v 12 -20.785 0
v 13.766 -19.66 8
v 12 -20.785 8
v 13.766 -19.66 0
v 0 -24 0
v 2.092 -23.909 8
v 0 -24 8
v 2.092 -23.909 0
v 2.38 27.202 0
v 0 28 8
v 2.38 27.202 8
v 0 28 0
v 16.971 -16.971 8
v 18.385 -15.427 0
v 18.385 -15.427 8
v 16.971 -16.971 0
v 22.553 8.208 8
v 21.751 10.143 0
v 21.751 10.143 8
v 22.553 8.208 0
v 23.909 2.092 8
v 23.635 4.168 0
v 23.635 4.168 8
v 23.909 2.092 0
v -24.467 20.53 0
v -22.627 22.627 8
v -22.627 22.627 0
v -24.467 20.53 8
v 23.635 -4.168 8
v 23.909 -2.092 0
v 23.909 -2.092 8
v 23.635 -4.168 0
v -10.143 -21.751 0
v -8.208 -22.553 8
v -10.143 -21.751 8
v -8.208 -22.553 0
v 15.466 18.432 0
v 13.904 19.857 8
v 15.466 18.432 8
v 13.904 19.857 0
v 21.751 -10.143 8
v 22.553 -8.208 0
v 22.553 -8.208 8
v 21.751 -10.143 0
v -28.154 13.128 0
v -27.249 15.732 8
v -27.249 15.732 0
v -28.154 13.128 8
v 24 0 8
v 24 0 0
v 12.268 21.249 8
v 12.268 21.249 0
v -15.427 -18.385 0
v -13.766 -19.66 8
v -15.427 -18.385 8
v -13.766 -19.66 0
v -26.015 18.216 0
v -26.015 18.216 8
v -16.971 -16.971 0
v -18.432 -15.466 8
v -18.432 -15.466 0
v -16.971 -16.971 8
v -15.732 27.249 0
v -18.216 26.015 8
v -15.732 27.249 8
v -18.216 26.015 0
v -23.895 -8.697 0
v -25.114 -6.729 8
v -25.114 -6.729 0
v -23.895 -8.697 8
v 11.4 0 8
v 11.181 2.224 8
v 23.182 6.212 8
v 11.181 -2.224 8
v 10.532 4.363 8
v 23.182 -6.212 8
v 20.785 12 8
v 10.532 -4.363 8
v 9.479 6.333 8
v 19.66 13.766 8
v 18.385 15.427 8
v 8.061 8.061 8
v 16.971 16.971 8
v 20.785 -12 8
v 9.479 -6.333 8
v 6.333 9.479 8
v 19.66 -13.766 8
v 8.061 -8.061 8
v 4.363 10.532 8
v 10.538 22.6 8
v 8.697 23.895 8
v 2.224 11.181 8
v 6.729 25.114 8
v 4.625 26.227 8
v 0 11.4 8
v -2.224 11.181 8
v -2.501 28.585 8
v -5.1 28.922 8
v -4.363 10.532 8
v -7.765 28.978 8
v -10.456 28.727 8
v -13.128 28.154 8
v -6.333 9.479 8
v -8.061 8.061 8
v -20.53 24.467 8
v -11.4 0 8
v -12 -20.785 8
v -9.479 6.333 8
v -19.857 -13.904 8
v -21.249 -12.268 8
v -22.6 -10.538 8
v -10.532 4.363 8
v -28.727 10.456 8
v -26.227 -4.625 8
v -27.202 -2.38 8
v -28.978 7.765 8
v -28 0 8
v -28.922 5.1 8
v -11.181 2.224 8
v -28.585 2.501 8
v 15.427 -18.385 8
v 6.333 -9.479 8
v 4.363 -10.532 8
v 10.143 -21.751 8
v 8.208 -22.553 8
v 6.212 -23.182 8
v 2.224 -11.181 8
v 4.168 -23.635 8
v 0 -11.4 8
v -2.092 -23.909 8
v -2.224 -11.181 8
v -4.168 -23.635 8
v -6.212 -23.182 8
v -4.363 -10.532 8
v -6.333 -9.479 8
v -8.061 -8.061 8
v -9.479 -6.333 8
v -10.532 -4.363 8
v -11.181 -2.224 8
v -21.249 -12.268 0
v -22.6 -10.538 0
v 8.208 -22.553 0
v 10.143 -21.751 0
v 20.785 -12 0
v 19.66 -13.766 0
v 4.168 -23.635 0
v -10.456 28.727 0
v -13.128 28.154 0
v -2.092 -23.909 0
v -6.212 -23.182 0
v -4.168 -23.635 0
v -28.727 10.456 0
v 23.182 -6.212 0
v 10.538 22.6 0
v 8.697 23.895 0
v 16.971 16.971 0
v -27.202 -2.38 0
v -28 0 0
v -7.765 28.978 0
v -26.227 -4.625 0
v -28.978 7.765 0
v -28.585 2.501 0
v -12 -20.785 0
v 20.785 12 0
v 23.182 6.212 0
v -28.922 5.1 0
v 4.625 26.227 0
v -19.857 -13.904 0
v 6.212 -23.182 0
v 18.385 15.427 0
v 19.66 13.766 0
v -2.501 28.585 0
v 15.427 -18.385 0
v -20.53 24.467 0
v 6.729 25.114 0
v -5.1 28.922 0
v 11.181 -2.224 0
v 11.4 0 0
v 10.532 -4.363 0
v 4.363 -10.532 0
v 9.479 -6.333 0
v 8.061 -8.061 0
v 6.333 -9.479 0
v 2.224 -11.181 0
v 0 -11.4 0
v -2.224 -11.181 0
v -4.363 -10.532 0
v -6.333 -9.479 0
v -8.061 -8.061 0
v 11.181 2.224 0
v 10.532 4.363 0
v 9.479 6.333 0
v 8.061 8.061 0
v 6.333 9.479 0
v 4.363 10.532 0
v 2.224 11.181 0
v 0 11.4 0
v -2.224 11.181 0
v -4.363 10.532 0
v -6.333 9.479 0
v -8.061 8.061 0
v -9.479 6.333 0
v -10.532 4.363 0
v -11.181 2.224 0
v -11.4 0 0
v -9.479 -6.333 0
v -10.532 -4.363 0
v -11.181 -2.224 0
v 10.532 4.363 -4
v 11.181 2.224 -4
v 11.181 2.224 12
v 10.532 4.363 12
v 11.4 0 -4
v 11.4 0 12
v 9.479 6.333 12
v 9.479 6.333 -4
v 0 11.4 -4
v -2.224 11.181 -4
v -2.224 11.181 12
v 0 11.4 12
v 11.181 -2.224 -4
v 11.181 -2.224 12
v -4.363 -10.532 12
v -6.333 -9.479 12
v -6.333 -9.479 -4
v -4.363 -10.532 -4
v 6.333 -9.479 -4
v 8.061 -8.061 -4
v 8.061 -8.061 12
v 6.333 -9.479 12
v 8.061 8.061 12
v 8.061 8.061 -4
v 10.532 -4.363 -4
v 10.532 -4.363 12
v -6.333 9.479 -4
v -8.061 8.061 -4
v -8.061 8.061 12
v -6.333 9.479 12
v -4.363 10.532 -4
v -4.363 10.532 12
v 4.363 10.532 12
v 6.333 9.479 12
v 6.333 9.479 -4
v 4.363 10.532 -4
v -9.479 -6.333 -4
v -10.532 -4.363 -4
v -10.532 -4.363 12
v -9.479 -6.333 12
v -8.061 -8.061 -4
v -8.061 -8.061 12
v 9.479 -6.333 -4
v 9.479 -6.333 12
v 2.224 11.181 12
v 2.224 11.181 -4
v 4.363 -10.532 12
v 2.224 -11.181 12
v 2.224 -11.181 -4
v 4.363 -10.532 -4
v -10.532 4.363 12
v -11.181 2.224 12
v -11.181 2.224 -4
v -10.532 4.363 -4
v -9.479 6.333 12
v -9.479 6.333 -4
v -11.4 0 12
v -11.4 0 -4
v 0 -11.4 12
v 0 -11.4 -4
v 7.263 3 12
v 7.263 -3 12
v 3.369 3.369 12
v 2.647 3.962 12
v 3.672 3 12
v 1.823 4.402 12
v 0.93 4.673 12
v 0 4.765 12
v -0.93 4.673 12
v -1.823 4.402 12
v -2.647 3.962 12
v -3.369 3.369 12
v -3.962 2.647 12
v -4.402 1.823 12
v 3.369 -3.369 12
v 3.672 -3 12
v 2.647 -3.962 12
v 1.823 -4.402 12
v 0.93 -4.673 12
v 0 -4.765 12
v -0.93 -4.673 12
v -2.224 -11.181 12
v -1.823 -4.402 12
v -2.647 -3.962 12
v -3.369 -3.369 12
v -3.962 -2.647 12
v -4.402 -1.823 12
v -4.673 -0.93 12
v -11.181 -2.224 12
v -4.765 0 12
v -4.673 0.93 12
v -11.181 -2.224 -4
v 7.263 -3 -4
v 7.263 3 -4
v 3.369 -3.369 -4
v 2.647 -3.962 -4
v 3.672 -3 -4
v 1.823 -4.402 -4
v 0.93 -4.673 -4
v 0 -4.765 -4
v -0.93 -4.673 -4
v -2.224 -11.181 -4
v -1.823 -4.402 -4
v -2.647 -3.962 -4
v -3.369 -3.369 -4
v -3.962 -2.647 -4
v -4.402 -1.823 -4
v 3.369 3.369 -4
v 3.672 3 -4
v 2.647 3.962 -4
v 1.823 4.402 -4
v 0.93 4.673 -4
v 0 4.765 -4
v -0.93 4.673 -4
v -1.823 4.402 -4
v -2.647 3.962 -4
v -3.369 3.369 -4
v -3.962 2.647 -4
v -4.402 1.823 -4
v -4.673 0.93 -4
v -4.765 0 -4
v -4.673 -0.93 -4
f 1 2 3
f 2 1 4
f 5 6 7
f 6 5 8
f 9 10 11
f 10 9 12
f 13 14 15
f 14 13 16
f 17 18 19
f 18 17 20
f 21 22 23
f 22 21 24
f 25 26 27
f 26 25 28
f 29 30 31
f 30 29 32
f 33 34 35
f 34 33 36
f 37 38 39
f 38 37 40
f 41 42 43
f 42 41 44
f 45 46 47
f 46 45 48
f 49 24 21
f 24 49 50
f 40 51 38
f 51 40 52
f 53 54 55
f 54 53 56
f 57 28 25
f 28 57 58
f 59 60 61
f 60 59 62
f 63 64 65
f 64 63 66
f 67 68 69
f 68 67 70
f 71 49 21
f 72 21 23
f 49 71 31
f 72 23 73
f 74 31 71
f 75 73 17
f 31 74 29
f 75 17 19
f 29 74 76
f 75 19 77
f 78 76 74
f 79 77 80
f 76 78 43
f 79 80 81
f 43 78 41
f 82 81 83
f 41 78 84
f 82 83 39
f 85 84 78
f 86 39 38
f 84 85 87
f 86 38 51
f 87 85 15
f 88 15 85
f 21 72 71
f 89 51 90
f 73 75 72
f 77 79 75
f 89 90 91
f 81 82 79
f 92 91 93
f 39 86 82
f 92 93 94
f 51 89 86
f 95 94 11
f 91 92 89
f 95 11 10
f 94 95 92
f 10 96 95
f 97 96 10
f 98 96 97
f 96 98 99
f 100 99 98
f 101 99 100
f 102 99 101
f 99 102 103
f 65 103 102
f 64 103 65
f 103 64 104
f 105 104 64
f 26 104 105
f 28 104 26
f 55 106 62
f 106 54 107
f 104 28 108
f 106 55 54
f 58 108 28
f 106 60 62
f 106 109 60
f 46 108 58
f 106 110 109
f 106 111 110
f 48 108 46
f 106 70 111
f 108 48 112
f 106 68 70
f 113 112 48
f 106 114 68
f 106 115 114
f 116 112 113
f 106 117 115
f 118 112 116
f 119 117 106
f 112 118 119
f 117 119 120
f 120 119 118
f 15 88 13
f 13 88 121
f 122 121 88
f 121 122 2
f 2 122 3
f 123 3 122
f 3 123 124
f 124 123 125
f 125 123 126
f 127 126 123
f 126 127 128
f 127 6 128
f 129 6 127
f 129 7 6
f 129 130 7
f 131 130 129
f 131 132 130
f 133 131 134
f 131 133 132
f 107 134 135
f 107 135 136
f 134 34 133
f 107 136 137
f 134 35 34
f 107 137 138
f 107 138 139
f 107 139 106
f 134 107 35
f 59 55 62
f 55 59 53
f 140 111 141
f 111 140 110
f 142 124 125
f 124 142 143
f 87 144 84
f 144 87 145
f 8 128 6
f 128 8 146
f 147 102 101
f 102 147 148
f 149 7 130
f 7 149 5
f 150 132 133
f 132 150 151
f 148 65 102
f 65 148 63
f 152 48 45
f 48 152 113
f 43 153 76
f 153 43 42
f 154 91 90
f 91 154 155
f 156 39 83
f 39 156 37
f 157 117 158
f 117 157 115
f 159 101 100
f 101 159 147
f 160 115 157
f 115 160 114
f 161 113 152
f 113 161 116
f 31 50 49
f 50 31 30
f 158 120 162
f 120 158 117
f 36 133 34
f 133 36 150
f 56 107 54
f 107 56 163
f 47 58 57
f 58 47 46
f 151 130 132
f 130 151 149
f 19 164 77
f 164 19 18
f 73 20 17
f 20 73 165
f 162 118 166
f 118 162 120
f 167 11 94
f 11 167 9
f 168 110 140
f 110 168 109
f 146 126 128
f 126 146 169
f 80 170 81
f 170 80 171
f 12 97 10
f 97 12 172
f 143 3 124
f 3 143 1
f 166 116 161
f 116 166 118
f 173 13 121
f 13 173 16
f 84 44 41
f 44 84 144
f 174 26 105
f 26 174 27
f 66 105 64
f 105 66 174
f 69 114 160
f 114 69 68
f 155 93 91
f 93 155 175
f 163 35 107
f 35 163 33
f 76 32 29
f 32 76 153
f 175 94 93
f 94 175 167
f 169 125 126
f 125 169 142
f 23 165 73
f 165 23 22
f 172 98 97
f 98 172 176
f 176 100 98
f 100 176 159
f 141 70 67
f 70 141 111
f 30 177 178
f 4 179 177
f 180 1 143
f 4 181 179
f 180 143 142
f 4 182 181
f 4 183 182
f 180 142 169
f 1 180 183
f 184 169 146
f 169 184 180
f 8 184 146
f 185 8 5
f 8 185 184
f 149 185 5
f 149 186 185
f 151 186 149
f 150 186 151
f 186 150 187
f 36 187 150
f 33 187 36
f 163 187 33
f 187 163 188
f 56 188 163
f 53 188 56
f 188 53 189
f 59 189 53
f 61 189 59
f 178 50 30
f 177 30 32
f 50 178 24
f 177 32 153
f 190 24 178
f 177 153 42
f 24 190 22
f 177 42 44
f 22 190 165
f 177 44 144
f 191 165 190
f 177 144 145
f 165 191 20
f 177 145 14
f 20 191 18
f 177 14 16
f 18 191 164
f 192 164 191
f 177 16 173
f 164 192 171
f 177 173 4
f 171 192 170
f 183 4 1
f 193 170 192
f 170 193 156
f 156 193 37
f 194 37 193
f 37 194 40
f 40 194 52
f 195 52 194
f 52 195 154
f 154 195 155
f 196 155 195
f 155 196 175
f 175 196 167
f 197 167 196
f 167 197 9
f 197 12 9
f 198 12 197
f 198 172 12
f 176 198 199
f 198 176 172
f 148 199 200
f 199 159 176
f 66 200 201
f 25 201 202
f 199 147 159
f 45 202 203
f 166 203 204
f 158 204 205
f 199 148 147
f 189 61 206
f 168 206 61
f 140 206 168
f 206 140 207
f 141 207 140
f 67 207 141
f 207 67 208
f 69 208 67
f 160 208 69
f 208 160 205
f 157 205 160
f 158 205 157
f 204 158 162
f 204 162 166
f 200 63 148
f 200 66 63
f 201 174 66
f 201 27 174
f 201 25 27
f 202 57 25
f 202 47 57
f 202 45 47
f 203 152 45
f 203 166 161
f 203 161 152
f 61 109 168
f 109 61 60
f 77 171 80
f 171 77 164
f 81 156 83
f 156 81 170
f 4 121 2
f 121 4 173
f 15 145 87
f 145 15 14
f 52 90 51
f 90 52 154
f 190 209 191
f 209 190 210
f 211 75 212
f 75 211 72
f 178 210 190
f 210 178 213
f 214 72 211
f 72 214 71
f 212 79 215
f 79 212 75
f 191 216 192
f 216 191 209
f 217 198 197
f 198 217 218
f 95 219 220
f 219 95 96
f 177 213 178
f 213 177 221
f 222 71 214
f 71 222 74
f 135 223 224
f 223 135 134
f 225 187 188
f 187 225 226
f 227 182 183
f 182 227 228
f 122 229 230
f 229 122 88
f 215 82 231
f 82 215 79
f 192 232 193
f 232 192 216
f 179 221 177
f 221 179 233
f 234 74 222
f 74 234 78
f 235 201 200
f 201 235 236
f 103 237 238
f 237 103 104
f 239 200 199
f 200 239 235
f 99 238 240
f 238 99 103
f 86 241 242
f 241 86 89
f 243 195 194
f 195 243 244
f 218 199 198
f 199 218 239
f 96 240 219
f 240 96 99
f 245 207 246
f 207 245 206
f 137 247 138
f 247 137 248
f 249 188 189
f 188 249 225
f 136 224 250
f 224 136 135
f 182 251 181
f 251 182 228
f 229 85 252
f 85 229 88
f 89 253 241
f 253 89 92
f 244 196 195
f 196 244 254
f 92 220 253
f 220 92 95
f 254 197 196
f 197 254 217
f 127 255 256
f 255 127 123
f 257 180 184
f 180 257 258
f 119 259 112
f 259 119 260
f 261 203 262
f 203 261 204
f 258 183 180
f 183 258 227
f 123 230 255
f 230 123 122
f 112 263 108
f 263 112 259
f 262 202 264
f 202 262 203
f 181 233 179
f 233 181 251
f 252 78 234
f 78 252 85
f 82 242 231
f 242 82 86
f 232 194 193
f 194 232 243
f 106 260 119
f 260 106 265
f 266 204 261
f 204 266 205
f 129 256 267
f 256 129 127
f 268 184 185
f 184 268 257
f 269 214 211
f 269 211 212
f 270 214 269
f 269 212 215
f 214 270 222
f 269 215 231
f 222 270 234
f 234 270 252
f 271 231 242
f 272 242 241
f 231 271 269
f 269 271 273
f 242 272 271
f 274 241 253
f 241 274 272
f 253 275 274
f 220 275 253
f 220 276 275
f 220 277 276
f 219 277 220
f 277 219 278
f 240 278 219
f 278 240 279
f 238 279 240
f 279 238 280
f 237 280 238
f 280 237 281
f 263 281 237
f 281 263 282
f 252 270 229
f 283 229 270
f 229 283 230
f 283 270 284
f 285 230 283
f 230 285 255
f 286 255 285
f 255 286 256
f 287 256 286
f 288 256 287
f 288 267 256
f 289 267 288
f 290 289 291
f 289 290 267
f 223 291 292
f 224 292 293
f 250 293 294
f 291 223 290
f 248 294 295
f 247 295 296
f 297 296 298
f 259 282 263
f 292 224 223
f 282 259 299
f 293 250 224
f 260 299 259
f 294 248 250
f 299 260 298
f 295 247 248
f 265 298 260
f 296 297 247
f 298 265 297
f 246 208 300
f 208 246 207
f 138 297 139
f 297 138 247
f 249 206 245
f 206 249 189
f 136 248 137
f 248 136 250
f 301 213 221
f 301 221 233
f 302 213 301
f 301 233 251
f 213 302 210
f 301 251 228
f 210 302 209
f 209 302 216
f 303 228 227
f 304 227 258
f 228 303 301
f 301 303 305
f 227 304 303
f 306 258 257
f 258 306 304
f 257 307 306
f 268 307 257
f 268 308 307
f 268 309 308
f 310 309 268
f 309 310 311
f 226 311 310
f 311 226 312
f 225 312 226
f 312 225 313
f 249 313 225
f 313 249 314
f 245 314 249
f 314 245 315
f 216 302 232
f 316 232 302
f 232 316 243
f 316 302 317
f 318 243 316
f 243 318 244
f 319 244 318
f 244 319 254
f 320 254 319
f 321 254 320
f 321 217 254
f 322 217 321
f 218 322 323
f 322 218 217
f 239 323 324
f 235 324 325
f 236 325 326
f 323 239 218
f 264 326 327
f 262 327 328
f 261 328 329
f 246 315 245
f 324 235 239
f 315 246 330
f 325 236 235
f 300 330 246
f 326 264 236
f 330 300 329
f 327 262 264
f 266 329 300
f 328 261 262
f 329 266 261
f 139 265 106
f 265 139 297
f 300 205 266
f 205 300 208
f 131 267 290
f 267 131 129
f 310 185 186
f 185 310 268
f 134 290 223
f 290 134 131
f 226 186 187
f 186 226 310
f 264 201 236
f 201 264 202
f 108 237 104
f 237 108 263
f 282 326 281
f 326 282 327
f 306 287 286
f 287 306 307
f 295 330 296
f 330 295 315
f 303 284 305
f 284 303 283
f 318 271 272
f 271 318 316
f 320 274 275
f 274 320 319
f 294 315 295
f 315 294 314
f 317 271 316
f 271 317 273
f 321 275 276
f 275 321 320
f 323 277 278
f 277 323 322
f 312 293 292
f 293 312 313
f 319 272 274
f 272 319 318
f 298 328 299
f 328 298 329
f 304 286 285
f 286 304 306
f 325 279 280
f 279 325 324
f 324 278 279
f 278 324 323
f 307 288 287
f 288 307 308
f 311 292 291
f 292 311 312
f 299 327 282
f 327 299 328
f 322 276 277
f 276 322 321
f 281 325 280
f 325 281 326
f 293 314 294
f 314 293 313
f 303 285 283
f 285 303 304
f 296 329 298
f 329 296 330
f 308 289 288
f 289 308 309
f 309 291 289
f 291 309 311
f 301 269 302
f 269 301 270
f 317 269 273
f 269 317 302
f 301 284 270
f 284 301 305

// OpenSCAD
$fn = 32;

// ----------------------------------------------------------------------
// Cam: base radius 24 mm with a 8 mm lift over 180 degrees
// ----------------------------------------------------------------------

// --- parameters (mm) ---
base_r = 24;              // base radius
lift = 8;                 // lift height above the base radius
lift_span = 180;          // angular width of the lift
lift_start = 45;          // angle where the lift starts
cam_t = 8;                // cam plate thickness
hub_d = 22.8;             // hub diameter
hub_h = 16;               // hub height
bore_d = 9.53;            // bore
key_w = 6;                // keyway width
key_depth = 3;            // keyway depth

cam_profile = [[24, 0], [23.909, 2.092], [23.635, 4.168], [23.182, 6.212], [22.553, 8.208], [21.751, 10.143], [20.785, 12], [19.66, 13.766], [18.385, 15.427], [16.971, 16.971], [15.466, 18.432], [13.904, 19.857], [12.268, 21.249], [10.538, 22.6], [8.697, 23.895], [6.729, 25.114], [4.625, 26.227], [2.38, 27.202], [0, 28], [-2.501, 28.585], [-5.1, 28.922], [-7.765, 28.978], [-10.456, 28.727], [-13.128, 28.154], [-15.732, 27.249], [-18.216, 26.015], [-20.53, 24.467], [-22.627, 22.627], [-24.467, 20.53], [-26.015, 18.216], [-27.249, 15.732], [-28.154, 13.128], [-28.727, 10.456], [-28.978, 7.765], [-28.922, 5.1], [-28.585, 2.501], [-28, 0], [-27.202, -2.38], [-26.227, -4.625], [-25.114, -6.729], [-23.895, -8.697], [-22.6, -10.538], [-21.249, -12.268], [-19.857, -13.904], [-18.432, -15.466], [-16.971, -16.971], [-15.427, -18.385], [-13.766, -19.66], [-12, -20.785], [-10.143, -21.751], [-8.208, -22.553], [-6.212, -23.182], [-4.168, -23.635], [-2.092, -23.909], [0, -24], [2.092, -23.909], [4.168, -23.635], [6.212, -23.182], [8.208, -22.553], [10.143, -21.751], [12, -20.785], [13.766, -19.66], [15.427, -18.385], [16.971, -16.971], [18.385, -15.427], [19.66, -13.766], [20.785, -12], [21.751, -10.143], [22.553, -8.208], [23.182, -6.212], [23.635, -4.168], [23.909, -2.092]];

difference() {
  union() {
    linear_extrude(height = cam_t) polygon(cam_profile);
    /* hub, proud of the cam plate on both sides */
    translate([0, 0, -4]) cylinder(h = hub_h, d = hub_d);
  }
  /* bore through the hub, 2.5 mm clear on both faces */
  translate([0, 0, -6.5]) cylinder(h = hub_h + 5, d = bore_d);
  /* keyway, milled through the whole hub */
  translate([1.763, -3, -6.5]) cube([5.5, 6, 21]);
}
